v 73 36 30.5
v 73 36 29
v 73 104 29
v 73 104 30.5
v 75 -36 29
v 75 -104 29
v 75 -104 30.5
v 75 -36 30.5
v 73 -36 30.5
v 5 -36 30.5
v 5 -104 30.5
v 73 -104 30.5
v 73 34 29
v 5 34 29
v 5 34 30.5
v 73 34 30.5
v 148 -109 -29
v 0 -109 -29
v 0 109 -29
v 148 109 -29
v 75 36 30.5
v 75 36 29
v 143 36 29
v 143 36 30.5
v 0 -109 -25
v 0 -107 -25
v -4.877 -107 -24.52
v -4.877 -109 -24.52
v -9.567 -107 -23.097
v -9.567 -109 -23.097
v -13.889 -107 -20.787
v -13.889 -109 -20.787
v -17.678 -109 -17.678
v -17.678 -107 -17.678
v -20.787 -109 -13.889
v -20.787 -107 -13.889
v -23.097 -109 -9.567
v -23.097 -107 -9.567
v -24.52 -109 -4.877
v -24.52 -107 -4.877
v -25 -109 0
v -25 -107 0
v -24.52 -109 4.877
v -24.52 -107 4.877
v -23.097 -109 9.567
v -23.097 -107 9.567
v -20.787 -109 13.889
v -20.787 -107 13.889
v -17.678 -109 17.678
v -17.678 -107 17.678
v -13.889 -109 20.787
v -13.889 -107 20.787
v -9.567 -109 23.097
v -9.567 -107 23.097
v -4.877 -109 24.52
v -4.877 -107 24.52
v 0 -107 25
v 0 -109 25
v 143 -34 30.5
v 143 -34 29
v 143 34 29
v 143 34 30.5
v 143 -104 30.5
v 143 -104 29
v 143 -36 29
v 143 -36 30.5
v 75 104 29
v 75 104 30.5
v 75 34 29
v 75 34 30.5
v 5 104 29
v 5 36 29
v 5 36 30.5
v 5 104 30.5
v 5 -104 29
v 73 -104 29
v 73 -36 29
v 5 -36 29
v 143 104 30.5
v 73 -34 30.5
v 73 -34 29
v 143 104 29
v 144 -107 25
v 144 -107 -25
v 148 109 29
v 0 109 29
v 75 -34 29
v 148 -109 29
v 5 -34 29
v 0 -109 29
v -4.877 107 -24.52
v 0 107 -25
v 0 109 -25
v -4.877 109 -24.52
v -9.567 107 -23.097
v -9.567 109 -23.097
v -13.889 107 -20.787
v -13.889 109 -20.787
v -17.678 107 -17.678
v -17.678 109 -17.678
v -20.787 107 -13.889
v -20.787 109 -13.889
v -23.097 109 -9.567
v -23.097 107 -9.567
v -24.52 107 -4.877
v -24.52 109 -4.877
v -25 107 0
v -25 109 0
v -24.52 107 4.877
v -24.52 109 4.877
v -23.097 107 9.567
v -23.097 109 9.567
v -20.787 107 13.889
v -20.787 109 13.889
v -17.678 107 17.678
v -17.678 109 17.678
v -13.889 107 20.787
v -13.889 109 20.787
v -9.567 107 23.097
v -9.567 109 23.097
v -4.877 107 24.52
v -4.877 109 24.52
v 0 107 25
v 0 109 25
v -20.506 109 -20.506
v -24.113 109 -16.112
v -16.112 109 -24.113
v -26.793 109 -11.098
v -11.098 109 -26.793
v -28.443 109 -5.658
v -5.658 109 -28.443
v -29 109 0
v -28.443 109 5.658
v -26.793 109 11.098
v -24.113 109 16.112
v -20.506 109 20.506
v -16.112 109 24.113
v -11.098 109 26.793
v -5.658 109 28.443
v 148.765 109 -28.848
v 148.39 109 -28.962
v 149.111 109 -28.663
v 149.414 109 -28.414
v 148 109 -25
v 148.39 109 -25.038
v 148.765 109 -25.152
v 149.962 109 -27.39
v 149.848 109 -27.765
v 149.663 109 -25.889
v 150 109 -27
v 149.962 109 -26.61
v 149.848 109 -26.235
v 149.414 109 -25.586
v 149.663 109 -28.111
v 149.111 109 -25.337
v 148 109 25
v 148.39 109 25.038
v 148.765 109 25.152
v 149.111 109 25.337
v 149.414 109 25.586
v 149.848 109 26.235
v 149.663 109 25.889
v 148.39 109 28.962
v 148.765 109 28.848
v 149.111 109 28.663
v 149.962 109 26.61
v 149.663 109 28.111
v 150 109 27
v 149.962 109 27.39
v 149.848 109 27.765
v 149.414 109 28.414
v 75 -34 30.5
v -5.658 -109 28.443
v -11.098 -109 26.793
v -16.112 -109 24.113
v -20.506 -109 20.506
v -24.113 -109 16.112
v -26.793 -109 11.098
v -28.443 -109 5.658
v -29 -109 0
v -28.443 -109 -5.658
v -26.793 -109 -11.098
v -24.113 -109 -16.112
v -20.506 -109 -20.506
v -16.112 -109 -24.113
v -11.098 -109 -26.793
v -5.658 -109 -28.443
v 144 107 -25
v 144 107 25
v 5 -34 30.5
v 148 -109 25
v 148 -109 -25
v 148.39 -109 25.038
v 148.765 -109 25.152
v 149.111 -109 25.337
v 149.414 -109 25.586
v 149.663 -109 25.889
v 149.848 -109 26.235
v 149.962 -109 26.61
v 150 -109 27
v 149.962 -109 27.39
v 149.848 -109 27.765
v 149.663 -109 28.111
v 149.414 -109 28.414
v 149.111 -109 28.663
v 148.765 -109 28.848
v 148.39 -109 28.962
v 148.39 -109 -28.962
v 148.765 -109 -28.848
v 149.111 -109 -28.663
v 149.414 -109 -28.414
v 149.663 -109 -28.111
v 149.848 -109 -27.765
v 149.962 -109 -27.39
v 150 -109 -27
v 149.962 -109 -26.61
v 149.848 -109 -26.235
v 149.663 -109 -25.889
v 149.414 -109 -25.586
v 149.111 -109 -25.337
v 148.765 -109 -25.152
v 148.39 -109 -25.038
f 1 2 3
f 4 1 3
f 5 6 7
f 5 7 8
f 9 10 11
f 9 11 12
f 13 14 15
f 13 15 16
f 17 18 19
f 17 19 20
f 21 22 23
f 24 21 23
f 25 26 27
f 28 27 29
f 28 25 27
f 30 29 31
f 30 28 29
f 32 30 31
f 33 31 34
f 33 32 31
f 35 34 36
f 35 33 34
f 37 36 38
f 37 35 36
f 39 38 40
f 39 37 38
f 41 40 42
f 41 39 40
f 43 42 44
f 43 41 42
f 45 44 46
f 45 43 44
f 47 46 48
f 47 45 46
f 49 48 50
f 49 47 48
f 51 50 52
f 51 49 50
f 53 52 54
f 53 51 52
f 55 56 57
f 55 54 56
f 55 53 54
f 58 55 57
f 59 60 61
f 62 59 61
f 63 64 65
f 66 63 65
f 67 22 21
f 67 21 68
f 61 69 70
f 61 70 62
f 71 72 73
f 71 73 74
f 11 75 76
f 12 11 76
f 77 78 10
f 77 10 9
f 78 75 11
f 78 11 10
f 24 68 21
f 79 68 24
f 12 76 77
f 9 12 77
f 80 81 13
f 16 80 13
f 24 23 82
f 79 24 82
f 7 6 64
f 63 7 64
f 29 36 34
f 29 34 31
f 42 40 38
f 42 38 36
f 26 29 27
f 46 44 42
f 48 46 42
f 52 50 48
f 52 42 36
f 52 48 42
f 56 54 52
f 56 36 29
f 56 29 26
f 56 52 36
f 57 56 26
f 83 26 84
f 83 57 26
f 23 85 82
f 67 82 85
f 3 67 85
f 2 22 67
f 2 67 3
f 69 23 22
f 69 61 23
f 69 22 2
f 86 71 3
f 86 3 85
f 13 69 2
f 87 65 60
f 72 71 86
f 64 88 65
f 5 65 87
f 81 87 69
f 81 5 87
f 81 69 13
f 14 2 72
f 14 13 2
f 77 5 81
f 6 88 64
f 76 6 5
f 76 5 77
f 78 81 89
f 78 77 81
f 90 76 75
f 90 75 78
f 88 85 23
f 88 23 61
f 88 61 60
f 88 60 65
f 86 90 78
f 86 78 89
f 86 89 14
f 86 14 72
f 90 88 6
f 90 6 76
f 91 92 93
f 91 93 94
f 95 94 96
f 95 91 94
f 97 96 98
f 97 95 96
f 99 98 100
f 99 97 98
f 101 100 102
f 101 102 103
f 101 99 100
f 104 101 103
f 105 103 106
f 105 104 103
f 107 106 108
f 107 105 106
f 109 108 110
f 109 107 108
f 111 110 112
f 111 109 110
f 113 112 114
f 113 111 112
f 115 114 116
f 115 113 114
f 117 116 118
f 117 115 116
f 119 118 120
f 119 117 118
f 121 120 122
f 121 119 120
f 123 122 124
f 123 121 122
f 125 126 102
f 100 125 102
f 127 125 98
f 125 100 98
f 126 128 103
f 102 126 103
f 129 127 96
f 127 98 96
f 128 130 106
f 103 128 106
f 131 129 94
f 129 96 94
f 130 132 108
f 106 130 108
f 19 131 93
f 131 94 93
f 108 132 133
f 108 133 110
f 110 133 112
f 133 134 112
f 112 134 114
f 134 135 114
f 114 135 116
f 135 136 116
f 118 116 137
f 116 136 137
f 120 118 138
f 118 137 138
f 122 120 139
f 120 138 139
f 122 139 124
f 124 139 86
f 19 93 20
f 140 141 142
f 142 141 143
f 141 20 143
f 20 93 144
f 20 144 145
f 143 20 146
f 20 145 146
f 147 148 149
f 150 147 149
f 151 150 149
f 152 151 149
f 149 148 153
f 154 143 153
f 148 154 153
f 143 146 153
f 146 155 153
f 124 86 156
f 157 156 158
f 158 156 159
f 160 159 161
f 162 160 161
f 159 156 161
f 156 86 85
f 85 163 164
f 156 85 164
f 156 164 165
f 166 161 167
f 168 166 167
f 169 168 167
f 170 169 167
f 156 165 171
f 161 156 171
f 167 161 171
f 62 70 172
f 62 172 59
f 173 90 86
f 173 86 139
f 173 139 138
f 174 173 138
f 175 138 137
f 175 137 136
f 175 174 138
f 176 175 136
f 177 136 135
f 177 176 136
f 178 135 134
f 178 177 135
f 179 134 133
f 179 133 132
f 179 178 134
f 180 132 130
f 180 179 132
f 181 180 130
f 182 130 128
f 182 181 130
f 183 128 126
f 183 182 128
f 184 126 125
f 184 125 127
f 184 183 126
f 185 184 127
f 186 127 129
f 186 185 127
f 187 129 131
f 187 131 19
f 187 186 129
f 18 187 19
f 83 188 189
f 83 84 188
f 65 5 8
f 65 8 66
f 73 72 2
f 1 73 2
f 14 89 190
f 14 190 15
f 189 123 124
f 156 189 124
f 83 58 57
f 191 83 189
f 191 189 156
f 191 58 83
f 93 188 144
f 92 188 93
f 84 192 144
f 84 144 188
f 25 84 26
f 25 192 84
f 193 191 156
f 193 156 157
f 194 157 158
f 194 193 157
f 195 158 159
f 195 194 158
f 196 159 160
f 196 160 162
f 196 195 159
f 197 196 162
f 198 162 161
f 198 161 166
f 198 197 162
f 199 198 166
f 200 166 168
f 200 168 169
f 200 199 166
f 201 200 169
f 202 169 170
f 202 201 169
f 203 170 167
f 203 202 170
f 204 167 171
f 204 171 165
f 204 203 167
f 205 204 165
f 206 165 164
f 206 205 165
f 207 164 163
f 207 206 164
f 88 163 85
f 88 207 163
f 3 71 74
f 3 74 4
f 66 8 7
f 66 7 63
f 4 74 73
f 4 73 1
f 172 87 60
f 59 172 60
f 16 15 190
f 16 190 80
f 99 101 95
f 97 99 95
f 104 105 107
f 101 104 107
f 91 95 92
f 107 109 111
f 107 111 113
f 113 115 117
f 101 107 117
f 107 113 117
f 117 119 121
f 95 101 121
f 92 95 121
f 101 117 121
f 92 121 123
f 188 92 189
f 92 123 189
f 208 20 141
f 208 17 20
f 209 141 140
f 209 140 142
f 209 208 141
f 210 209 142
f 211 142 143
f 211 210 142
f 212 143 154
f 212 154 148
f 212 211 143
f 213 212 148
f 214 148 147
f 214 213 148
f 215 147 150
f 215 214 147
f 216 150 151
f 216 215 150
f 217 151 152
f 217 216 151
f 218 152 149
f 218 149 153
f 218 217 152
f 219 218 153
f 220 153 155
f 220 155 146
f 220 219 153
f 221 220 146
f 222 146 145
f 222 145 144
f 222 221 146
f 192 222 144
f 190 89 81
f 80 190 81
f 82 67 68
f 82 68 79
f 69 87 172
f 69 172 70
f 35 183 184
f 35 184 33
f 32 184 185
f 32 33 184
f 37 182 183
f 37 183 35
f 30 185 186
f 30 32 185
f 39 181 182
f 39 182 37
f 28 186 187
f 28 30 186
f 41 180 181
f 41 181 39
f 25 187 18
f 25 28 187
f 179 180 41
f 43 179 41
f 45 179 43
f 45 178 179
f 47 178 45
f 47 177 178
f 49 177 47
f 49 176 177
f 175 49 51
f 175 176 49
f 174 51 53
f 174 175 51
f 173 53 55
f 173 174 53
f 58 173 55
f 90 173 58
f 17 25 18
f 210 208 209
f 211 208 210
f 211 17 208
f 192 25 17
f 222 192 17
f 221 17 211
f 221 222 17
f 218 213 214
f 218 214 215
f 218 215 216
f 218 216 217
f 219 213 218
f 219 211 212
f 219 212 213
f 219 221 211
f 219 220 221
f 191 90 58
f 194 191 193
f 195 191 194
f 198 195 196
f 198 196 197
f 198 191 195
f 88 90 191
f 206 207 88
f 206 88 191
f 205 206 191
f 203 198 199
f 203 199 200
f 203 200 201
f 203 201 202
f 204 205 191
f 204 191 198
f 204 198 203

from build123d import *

# Parameters (mm, degrees)
F1_DEPTH = 109
F3_DEPTH = 107
F4_W     = 68
F4_H     = 68
F5_DEPTH = 1.5


# Not quite as in the source:
# - ends of sketch curves that miss each other by under 0.0002 mm in the source are joined


with BuildPart() as f1:
    # F0 (on Front) → F1 (new body, symmetric)
    with BuildSketch(Plane.XZ):
        with BuildLine():
            ThreePointArc((0, -25), (-25, 0), (0, 25))
            Line((0, 25), (148, 25))
            ThreePointArc((148, 25), (150, 26.9999995828), (148, 28.9999995828))
            Line((148, 28.9999995828), (0, 28.9999991655))
            ThreePointArc((0, 28.9999991655), (-28.9999991655, 0), (0, -28.9999991655))
            Line((0, -28.9999991655), (148, -28.9999991655))
            ThreePointArc((148, -28.9999991655), (150, -26.9999995828), (148, -24.9999995828))
            Line((148, -24.9999995828), (0, -25))
        make_face()
    extrude(amount=F1_DEPTH, both=True)

    # F2 (on Front) → F3 (join, symmetric)
    with BuildSketch(Plane.XZ):
        with BuildLine():
            Line((144, 25), (0, 25))
            ThreePointArc((0, 25), (-25, 0), (0, -25))
            Line((0, -25), (144, -25))
            Line((144, -25), (144, 25))
        make_face()
    extrude(amount=F3_DEPTH, both=True)

    # F4 (on face) → F5 (join)
    with BuildSketch(Plane.XY.offset(28.9999991655)):
        with Locations((39, 70)):
            Rectangle(F4_W, F4_H)
        with Locations((39, 0)):
            Rectangle(F4_W, F4_H)
        with Locations((39, -70)):
            Rectangle(F4_W, F4_H)
        with Locations((109, 70)):
            Rectangle(F4_W, F4_H)
        with Locations((109, 0)):
            Rectangle(F4_W, F4_H)
        with Locations((109, -70)):
            Rectangle(F4_W, F4_H)
    extrude(amount=F5_DEPTH)


solid = f1.part
